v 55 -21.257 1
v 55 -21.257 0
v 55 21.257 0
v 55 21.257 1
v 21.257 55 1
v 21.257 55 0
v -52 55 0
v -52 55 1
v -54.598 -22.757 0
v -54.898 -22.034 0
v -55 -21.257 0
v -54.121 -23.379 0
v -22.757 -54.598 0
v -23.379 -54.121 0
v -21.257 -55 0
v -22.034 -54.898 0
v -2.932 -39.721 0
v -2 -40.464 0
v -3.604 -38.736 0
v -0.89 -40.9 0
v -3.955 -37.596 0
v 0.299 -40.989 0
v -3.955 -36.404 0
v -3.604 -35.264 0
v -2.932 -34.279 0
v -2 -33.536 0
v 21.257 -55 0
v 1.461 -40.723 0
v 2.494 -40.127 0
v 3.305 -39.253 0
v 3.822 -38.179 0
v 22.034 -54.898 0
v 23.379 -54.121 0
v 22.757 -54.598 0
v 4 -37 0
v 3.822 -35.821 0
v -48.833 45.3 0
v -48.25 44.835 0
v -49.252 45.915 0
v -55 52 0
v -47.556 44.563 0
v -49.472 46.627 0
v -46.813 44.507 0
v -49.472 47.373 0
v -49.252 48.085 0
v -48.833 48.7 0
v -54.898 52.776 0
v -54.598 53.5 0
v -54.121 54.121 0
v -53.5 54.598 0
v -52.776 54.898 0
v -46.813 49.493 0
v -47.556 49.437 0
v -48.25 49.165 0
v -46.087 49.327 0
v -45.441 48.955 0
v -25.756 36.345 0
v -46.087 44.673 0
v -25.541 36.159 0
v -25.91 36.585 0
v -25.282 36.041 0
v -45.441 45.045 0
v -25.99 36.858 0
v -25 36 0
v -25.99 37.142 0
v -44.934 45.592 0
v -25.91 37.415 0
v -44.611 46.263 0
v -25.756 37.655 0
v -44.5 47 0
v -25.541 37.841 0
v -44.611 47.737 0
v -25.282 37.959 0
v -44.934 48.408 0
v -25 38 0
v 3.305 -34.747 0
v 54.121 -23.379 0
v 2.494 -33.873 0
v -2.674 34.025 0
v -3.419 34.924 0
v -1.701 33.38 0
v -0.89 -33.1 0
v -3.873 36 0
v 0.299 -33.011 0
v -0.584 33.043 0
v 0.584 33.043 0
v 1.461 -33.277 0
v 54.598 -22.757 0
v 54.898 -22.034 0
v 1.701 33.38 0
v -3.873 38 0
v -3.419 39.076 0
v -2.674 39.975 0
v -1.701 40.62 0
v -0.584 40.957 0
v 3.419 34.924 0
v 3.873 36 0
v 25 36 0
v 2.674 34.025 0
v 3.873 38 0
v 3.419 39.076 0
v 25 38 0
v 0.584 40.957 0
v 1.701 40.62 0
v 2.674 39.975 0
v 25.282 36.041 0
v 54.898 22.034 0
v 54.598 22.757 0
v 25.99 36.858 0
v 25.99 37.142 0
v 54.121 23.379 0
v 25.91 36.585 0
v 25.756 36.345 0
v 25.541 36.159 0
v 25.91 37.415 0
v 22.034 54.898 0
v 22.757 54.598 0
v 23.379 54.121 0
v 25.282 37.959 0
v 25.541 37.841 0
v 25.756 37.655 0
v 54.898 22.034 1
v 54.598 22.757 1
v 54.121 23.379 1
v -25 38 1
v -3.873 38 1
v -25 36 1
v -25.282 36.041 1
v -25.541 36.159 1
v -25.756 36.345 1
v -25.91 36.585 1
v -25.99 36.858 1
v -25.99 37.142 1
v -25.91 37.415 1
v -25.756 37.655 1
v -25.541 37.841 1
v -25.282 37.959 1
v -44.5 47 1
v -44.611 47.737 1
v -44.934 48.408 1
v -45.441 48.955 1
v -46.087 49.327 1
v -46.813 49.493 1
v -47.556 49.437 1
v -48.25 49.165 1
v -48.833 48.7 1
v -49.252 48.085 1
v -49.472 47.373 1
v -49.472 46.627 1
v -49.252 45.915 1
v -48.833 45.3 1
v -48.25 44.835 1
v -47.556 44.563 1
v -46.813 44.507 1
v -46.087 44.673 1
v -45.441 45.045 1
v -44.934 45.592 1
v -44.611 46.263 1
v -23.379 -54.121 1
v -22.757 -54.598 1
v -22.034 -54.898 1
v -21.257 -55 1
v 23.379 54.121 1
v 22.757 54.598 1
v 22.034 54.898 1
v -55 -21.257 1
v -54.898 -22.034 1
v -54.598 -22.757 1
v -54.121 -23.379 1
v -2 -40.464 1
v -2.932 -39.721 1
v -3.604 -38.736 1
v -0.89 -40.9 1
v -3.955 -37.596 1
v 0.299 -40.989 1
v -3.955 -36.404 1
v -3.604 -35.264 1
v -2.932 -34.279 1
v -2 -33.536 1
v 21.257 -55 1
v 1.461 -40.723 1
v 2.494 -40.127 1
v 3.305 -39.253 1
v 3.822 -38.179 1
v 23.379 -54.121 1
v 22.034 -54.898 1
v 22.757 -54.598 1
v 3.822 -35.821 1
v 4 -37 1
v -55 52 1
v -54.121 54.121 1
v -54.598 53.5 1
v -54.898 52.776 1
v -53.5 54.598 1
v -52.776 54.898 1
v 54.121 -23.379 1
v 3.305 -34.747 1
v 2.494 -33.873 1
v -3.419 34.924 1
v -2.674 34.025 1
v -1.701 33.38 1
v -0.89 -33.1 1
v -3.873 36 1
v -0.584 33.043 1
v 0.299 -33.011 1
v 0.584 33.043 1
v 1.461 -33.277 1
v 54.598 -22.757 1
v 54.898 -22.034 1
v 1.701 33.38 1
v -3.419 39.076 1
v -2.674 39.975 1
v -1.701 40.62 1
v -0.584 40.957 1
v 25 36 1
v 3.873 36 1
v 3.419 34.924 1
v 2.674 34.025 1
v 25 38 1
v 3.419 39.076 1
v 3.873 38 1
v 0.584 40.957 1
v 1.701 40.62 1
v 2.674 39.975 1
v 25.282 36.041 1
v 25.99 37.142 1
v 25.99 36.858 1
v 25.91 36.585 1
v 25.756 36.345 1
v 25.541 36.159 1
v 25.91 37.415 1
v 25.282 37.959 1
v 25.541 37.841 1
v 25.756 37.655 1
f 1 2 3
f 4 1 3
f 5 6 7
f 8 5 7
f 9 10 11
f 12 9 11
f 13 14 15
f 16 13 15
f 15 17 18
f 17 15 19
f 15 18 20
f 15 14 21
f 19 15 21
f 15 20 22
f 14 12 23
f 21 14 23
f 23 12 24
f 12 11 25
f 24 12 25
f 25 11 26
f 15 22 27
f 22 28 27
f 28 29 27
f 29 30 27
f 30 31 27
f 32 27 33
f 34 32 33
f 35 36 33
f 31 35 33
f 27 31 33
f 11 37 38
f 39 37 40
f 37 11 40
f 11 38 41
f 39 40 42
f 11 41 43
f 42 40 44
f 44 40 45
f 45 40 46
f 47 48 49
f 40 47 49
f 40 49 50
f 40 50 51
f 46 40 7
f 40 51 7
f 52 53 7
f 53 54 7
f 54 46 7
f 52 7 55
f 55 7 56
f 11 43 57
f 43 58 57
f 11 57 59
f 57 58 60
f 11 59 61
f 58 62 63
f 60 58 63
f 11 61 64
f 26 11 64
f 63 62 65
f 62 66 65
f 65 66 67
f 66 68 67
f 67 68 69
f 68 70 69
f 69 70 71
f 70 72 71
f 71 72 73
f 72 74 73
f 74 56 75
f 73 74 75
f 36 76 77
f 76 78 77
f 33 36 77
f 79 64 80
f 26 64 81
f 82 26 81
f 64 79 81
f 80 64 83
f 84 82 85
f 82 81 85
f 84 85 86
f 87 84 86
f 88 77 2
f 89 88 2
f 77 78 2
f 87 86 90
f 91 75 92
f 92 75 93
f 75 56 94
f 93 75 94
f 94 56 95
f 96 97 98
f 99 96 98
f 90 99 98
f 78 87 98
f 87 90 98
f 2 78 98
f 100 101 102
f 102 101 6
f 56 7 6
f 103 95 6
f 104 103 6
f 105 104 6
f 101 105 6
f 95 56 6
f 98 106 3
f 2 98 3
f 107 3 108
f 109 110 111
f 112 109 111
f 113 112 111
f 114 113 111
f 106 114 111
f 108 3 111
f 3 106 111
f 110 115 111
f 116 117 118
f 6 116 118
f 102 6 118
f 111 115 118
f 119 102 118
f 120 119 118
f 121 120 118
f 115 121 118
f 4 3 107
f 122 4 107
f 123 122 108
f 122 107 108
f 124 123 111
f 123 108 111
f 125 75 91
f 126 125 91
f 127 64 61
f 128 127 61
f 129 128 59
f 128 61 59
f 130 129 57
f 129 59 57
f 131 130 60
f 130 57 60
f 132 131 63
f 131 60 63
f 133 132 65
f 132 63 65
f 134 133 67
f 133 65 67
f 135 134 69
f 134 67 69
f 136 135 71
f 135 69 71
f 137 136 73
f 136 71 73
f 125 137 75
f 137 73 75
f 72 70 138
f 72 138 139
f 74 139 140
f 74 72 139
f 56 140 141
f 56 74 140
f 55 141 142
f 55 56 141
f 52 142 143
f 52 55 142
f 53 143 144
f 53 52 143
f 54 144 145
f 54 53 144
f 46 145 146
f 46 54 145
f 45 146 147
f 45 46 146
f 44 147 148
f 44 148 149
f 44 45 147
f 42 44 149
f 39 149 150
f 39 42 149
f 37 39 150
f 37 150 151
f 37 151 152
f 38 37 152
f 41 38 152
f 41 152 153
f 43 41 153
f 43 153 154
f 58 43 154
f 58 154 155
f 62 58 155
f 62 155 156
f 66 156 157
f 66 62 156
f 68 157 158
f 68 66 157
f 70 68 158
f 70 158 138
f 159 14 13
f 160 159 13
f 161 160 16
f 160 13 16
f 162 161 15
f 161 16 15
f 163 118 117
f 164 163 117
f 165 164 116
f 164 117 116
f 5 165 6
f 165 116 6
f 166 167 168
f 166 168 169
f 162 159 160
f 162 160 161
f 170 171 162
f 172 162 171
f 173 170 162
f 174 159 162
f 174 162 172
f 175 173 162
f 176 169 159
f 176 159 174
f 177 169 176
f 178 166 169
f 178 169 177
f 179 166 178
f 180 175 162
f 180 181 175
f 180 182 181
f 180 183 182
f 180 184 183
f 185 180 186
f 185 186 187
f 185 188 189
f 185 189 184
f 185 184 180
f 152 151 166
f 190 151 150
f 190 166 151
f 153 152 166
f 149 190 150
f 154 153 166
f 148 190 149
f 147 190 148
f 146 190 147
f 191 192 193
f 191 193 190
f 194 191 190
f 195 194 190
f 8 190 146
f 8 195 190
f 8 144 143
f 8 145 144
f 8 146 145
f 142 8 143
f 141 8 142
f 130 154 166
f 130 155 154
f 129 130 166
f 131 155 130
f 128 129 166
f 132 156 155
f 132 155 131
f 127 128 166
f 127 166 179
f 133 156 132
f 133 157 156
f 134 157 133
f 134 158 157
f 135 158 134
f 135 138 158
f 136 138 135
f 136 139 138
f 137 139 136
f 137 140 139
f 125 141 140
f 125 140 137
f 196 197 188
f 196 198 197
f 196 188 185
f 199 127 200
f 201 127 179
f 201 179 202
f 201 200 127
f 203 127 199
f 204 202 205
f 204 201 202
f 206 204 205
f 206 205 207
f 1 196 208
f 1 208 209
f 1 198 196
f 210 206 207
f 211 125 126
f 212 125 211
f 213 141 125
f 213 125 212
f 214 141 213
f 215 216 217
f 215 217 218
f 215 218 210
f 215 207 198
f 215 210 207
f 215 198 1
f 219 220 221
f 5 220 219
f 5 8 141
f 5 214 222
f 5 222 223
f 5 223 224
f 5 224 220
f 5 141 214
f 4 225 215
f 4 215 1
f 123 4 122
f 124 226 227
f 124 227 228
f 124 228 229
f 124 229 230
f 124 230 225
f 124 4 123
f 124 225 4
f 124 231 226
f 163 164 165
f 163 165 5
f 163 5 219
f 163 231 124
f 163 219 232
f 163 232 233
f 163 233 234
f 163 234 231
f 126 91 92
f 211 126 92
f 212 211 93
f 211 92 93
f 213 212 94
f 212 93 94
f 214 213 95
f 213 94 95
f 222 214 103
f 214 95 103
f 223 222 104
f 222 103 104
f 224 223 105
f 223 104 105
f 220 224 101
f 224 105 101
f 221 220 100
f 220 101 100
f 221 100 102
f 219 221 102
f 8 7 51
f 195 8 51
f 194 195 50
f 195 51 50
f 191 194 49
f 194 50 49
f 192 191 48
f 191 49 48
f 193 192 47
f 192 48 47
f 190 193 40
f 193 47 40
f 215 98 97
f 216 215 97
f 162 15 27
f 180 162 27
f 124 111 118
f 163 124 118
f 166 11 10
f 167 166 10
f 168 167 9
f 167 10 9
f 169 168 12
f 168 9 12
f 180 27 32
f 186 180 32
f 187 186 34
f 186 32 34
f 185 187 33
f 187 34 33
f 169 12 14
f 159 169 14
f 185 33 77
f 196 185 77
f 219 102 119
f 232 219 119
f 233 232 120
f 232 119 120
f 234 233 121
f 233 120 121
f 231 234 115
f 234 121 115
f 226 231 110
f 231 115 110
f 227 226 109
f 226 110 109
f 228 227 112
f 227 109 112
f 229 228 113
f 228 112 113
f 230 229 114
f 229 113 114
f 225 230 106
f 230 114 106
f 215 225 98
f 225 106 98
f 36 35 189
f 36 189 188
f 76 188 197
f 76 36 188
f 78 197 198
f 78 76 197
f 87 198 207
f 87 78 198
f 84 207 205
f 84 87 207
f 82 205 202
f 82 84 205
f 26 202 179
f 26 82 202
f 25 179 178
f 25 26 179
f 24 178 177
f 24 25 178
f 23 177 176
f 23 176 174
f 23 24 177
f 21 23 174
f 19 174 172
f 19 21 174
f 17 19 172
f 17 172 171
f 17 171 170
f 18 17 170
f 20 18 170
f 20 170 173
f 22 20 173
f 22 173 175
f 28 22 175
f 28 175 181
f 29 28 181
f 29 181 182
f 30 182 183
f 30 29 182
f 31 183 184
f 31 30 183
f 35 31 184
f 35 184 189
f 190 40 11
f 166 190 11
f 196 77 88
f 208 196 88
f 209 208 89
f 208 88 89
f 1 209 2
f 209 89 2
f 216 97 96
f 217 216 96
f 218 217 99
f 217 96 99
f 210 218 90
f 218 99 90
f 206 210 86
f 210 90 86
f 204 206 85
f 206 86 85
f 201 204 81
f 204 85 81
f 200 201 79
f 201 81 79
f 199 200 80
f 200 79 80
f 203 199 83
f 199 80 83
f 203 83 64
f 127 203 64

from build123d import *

# Parameters (mm, degrees)
SKETCH1_R           = 2.5
SKETCH1_R_2         = 4
BOSS_EXTRUDE1_DEPTH = 1


with BuildPart() as part:
    # Sketch1 → Boss-Extrude1 (new body)
    with BuildSketch(Plane.XY):
        with BuildLine():
            Line((55, -21.257359313), (55, 21.257359313))
            ThreePointArc((55, 21.257359313), (54.771638598, 22.40540961), (54.121320344, 23.378679656))
            Line((54.121320344, 23.378679656), (23.378679656, 54.121320344))
            ThreePointArc((23.378679656, 54.121320344), (22.40540961, 54.771638598), (21.257359313, 55))
            Line((21.257359313, 55), (-52, 55))
            ThreePointArc((-52, 55), (-54.121320344, 54.121320344), (-55, 52))
            Line((-55, 52), (-55, -21.257359313))
            ThreePointArc((-55, -21.257359313), (-54.771638598, -22.40540961), (-54.121320344, -23.378679656))
            Line((-54.121320344, -23.378679656), (-23.378679656, -54.121320344))
            ThreePointArc((-23.378679656, -54.121320344), (-22.40540961, -54.771638598), (-21.257359313, -55))
            Line((-21.257359313, -55), (21.257359313, -55))
            ThreePointArc((21.257359313, -55), (22.40540961, -54.771638598), (23.378679656, -54.121320344))
            Line((23.378679656, -54.121320344), (54.121320344, -23.378679656))
            ThreePointArc((54.121320344, -23.378679656), (54.771638598, -22.40540961), (55, -21.257359313))
        make_face()
        with Locations((-47, 47)):
            Circle(SKETCH1_R, mode=Mode.SUBTRACT)
        with Locations((0, -37)):
            Circle(SKETCH1_R_2, mode=Mode.SUBTRACT)
        with BuildLine():
            Line((-25, 38), (-3.872983346, 38))
            ThreePointArc((-3.872983346, 38), (0, 41), (3.872983346, 38))
            Line((3.872983346, 38), (25, 38))
            ThreePointArc((25, 38), (26, 37), (25, 36))
            Line((25, 36), (3.872983346, 36))
            ThreePointArc((3.872983346, 36), (0, 33), (-3.872983346, 36))
            Line((-3.872983346, 36), (-25, 36))
            ThreePointArc((-25, 36), (-26, 37), (-25, 38))
        make_face(mode=Mode.SUBTRACT)
    extrude(amount=BOSS_EXTRUDE1_DEPTH)


solid = part.part
